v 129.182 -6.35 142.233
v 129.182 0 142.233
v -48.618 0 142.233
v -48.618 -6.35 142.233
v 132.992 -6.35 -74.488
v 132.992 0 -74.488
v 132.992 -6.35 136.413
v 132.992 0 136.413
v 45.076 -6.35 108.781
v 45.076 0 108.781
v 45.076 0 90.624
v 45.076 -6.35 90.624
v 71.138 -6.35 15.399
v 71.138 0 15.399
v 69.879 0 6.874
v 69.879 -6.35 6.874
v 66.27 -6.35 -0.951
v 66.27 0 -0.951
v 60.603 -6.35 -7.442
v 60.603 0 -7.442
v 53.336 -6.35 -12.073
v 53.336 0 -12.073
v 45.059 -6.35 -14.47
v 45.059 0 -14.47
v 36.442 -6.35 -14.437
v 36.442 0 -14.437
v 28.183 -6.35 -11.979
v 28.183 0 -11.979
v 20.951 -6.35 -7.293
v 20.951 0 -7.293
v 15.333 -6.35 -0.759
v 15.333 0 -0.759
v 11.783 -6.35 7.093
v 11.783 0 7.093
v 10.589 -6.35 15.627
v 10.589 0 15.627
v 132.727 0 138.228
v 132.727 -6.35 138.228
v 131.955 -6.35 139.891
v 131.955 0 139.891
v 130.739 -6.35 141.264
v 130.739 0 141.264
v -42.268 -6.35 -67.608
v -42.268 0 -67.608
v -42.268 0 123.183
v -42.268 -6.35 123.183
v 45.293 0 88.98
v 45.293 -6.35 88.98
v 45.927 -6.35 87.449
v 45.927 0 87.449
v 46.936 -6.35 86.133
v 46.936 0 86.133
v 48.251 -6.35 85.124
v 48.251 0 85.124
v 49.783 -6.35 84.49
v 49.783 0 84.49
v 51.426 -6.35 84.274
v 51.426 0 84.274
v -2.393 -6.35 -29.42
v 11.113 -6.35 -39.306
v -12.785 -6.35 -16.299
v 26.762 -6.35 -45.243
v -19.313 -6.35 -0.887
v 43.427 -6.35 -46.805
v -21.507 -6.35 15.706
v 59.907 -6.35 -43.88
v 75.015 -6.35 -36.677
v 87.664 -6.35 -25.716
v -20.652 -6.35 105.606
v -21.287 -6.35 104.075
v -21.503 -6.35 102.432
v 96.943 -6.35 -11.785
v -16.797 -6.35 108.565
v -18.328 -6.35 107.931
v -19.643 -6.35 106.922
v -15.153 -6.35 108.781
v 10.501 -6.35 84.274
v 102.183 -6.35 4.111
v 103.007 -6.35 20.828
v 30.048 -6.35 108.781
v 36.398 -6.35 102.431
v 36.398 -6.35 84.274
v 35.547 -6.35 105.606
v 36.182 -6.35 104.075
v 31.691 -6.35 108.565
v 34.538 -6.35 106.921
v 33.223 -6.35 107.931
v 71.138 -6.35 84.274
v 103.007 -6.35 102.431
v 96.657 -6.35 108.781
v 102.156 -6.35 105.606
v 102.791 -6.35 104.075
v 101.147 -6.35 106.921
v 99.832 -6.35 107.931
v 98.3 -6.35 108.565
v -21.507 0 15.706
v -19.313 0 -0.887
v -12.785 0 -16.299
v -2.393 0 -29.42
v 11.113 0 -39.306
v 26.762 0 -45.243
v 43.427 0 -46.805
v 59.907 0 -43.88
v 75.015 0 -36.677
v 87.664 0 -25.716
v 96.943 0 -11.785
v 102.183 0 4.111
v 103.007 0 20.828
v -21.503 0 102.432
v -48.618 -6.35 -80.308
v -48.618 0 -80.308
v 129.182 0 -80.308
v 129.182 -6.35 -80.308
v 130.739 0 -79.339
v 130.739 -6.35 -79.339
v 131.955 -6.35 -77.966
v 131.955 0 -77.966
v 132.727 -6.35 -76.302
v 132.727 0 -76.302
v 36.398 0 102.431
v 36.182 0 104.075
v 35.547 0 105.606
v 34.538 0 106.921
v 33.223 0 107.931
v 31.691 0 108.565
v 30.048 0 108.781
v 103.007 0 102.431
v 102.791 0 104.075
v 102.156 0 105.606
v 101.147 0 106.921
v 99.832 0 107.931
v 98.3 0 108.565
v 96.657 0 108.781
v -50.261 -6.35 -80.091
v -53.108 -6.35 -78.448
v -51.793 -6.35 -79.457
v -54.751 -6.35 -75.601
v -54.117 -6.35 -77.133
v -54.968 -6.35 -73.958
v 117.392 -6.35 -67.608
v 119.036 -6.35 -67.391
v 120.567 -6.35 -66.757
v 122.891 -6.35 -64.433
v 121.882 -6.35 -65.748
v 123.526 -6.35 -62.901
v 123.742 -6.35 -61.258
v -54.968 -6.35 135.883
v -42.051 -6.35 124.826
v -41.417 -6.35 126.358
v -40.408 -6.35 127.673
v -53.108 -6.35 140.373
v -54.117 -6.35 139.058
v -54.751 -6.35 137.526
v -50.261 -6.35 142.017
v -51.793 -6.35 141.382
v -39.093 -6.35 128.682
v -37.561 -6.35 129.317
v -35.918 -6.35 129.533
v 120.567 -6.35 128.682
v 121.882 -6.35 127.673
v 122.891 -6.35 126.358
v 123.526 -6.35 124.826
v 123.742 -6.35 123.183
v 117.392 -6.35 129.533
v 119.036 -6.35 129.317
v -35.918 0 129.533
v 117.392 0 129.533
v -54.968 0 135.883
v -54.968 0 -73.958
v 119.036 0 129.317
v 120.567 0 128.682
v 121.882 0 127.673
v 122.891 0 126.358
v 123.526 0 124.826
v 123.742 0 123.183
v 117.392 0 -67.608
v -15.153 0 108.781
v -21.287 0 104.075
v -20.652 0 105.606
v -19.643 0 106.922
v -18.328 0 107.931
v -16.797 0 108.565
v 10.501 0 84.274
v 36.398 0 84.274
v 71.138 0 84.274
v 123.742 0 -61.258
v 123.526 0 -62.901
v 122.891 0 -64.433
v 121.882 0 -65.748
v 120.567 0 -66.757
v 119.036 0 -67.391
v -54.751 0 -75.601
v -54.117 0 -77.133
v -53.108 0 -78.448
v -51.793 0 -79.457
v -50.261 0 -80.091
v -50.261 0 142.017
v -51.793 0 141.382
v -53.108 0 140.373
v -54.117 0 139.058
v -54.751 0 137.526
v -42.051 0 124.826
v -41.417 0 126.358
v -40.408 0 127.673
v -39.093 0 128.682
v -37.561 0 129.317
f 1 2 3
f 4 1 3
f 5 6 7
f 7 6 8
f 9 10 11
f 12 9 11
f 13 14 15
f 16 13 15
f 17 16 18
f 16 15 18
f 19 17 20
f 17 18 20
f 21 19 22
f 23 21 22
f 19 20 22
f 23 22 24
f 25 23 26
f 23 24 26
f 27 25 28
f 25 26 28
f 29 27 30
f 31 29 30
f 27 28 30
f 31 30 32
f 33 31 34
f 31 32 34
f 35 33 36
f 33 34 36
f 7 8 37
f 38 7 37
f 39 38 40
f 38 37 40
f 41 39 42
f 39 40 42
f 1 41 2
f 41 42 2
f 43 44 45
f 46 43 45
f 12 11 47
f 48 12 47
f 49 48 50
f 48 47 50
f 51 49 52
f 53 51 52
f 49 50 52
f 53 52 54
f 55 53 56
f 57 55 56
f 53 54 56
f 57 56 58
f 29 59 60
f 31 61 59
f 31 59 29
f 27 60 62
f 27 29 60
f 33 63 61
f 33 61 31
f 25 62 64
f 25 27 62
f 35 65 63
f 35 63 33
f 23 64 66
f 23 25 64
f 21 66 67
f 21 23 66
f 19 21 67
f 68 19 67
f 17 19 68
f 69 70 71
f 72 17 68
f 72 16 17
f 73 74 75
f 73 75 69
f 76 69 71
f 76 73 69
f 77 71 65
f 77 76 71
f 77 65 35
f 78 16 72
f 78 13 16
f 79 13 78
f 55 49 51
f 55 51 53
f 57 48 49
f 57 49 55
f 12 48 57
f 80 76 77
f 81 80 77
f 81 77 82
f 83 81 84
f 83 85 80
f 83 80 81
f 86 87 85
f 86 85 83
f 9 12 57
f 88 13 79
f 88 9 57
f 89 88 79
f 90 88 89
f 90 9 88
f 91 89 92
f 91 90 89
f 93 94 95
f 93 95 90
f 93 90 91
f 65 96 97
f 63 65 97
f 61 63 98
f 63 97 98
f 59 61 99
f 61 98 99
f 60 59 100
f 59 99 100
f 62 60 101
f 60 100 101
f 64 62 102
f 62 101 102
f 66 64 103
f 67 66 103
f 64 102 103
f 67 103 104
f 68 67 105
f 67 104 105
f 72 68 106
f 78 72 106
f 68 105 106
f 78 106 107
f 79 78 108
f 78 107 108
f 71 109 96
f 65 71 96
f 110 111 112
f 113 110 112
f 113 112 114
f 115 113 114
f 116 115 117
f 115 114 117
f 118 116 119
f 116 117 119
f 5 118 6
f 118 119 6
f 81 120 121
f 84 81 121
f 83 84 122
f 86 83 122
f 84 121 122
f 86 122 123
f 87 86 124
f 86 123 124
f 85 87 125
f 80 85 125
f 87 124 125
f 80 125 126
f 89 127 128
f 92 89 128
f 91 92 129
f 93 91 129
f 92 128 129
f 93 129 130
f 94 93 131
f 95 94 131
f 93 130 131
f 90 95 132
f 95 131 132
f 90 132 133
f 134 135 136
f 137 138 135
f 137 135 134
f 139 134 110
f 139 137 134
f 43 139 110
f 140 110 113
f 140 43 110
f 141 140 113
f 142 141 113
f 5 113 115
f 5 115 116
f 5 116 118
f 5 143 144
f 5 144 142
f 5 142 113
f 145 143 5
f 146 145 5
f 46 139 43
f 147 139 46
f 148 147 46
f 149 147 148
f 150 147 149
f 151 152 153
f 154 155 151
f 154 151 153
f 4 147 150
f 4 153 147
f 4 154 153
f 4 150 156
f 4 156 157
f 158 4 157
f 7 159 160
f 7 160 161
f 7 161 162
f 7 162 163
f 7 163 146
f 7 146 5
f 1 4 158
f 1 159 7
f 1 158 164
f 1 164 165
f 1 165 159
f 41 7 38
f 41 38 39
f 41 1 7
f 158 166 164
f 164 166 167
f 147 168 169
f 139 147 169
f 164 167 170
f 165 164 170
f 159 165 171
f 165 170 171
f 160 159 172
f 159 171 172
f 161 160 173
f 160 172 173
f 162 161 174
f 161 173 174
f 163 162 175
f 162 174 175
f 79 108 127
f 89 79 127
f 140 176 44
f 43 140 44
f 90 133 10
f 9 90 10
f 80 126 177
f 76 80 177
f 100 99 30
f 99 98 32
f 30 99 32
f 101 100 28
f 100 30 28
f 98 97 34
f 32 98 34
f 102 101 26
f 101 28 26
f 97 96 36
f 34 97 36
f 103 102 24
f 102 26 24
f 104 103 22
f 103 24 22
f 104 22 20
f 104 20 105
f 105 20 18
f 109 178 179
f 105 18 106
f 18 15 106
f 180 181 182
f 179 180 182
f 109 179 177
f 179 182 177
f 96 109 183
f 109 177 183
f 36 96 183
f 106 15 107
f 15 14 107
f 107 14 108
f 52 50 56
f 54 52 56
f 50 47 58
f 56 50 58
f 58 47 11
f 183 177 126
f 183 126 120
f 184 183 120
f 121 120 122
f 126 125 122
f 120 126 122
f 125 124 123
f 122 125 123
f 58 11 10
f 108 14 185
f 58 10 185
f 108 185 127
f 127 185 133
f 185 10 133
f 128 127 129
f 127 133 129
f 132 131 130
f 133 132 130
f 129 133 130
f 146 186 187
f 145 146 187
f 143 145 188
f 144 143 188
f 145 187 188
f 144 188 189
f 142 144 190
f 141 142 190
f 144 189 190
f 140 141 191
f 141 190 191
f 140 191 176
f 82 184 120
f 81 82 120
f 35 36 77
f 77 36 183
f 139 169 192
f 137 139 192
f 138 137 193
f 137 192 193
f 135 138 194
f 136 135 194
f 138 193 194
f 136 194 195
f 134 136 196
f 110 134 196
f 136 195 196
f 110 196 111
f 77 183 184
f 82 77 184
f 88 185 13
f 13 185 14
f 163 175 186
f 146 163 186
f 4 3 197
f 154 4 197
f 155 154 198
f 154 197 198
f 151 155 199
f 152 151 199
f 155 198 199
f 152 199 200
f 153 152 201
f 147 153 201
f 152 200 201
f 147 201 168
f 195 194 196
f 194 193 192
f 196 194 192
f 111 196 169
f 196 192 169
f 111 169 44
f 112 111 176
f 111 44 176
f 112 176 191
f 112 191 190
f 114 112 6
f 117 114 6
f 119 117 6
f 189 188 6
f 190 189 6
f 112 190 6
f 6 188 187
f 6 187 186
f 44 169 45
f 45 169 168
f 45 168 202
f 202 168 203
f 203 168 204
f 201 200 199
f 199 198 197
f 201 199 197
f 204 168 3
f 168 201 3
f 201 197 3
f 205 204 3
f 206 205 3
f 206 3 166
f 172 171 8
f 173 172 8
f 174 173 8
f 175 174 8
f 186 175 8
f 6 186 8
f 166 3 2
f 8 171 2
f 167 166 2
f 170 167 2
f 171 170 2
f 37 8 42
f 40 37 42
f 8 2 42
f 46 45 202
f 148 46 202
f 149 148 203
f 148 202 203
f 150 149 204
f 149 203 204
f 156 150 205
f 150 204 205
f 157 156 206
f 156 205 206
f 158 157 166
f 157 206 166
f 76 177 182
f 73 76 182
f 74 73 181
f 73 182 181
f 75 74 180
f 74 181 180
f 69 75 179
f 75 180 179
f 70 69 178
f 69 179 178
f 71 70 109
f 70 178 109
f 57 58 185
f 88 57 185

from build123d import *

# Parameters (mm, degrees)
F1_DEPTH = 6.35
F2_DEPTH = 6.35


with BuildPart() as f1:
    # F0 (on Front) → F1 (new body)
    with BuildSketch(Plane.XZ):
        with BuildLine():
            ThreePointArc((103.00695, 102.431316), (101.147078, 106.921444), (96.65695, 108.781316))
            Line((96.65695, 108.781316), (45.076356, 108.781316))
            Line((45.076356, 108.781316), (45.076356, 90.623581))
            ThreePointArc((45.076356, 90.623581), (46.936228, 86.133453), (51.426356, 84.273581))
            Line((51.426356, 84.273581), (71.137713, 84.273581))
            Line((71.137713, 84.273581), (71.137713, 15.398908))
            ThreePointArc((71.137713, 15.398908), (40.749251, -14.761817), (10.588526, 15.626645))
            Line((10.588526, 15.626645), (10.501273, 84.273581))
            Line((10.501273, 84.273581), (36.397954, 84.273581))
            Line((36.397954, 84.273581), (36.397954, 102.431316))
            ThreePointArc((36.397954, 102.431316), (34.538082, 106.921444), (30.047954, 108.781316))
            Line((30.047954, 108.781316), (-15.153159, 108.781316))
            ThreePointArc((-15.153159, 108.781316), (-19.643179, 106.921552), (-21.503158, 102.43162))
            Line((-21.503158, 102.43162), (-21.507319, 15.705716))
            ThreePointArc((-21.507319, 15.705716), (43.426838, -46.805248), (103.00695, 20.828142))
            Line((103.00695, 20.828142), (103.00695, 102.431316))
        make_face()
    extrude(amount=F1_DEPTH)


with BuildPart() as f2:
    # F0 (on Front) → F2 (new body)
    with BuildSketch(Plane.XZ):
        with BuildLine():
            ThreePointArc((-48.617846, 142.23295), (-53.107974, 140.373078), (-54.967846, 135.88295))
            Line((-54.967846, 135.88295), (-54.967846, -73.957573))
            ThreePointArc((-54.967846, -73.957573), (-53.107974, -78.447701), (-48.617846, -80.307573))
            Line((-48.617846, -80.307573), (129.182154, -80.307573))
            ThreePointArc((129.182154, -80.307573), (131.954945, -77.96574), (132.992154, -74.487702))
            Line((132.992154, -74.487702), (132.992154, 136.413079))
            ThreePointArc((132.992154, 136.413079), (131.954945, 139.891117), (129.182154, 142.23295))
            Line((129.182154, 142.23295), (-48.617846, 142.23295))
        make_face()
        with BuildLine():
            Line((-35.917846, 129.53295), (117.392156, 129.53295))
            ThreePointArc((117.392156, 129.53295), (121.882284, 127.673078), (123.742156, 123.18295))
            Line((123.742156, 123.18295), (123.742156, -61.257573))
            ThreePointArc((123.742156, -61.257573), (121.882284, -65.747701), (117.392156, -67.607573))
            Line((117.392156, -67.607573), (-42.267846, -67.607573))
            Line((-42.267846, -67.607573), (-42.267846, 123.18295))
            ThreePointArc((-42.267846, 123.18295), (-40.407974, 127.673078), (-35.917846, 129.53295))
        make_face(mode=Mode.SUBTRACT)
    extrude(amount=F2_DEPTH)


solid = Compound([f1.part, f2.part])
